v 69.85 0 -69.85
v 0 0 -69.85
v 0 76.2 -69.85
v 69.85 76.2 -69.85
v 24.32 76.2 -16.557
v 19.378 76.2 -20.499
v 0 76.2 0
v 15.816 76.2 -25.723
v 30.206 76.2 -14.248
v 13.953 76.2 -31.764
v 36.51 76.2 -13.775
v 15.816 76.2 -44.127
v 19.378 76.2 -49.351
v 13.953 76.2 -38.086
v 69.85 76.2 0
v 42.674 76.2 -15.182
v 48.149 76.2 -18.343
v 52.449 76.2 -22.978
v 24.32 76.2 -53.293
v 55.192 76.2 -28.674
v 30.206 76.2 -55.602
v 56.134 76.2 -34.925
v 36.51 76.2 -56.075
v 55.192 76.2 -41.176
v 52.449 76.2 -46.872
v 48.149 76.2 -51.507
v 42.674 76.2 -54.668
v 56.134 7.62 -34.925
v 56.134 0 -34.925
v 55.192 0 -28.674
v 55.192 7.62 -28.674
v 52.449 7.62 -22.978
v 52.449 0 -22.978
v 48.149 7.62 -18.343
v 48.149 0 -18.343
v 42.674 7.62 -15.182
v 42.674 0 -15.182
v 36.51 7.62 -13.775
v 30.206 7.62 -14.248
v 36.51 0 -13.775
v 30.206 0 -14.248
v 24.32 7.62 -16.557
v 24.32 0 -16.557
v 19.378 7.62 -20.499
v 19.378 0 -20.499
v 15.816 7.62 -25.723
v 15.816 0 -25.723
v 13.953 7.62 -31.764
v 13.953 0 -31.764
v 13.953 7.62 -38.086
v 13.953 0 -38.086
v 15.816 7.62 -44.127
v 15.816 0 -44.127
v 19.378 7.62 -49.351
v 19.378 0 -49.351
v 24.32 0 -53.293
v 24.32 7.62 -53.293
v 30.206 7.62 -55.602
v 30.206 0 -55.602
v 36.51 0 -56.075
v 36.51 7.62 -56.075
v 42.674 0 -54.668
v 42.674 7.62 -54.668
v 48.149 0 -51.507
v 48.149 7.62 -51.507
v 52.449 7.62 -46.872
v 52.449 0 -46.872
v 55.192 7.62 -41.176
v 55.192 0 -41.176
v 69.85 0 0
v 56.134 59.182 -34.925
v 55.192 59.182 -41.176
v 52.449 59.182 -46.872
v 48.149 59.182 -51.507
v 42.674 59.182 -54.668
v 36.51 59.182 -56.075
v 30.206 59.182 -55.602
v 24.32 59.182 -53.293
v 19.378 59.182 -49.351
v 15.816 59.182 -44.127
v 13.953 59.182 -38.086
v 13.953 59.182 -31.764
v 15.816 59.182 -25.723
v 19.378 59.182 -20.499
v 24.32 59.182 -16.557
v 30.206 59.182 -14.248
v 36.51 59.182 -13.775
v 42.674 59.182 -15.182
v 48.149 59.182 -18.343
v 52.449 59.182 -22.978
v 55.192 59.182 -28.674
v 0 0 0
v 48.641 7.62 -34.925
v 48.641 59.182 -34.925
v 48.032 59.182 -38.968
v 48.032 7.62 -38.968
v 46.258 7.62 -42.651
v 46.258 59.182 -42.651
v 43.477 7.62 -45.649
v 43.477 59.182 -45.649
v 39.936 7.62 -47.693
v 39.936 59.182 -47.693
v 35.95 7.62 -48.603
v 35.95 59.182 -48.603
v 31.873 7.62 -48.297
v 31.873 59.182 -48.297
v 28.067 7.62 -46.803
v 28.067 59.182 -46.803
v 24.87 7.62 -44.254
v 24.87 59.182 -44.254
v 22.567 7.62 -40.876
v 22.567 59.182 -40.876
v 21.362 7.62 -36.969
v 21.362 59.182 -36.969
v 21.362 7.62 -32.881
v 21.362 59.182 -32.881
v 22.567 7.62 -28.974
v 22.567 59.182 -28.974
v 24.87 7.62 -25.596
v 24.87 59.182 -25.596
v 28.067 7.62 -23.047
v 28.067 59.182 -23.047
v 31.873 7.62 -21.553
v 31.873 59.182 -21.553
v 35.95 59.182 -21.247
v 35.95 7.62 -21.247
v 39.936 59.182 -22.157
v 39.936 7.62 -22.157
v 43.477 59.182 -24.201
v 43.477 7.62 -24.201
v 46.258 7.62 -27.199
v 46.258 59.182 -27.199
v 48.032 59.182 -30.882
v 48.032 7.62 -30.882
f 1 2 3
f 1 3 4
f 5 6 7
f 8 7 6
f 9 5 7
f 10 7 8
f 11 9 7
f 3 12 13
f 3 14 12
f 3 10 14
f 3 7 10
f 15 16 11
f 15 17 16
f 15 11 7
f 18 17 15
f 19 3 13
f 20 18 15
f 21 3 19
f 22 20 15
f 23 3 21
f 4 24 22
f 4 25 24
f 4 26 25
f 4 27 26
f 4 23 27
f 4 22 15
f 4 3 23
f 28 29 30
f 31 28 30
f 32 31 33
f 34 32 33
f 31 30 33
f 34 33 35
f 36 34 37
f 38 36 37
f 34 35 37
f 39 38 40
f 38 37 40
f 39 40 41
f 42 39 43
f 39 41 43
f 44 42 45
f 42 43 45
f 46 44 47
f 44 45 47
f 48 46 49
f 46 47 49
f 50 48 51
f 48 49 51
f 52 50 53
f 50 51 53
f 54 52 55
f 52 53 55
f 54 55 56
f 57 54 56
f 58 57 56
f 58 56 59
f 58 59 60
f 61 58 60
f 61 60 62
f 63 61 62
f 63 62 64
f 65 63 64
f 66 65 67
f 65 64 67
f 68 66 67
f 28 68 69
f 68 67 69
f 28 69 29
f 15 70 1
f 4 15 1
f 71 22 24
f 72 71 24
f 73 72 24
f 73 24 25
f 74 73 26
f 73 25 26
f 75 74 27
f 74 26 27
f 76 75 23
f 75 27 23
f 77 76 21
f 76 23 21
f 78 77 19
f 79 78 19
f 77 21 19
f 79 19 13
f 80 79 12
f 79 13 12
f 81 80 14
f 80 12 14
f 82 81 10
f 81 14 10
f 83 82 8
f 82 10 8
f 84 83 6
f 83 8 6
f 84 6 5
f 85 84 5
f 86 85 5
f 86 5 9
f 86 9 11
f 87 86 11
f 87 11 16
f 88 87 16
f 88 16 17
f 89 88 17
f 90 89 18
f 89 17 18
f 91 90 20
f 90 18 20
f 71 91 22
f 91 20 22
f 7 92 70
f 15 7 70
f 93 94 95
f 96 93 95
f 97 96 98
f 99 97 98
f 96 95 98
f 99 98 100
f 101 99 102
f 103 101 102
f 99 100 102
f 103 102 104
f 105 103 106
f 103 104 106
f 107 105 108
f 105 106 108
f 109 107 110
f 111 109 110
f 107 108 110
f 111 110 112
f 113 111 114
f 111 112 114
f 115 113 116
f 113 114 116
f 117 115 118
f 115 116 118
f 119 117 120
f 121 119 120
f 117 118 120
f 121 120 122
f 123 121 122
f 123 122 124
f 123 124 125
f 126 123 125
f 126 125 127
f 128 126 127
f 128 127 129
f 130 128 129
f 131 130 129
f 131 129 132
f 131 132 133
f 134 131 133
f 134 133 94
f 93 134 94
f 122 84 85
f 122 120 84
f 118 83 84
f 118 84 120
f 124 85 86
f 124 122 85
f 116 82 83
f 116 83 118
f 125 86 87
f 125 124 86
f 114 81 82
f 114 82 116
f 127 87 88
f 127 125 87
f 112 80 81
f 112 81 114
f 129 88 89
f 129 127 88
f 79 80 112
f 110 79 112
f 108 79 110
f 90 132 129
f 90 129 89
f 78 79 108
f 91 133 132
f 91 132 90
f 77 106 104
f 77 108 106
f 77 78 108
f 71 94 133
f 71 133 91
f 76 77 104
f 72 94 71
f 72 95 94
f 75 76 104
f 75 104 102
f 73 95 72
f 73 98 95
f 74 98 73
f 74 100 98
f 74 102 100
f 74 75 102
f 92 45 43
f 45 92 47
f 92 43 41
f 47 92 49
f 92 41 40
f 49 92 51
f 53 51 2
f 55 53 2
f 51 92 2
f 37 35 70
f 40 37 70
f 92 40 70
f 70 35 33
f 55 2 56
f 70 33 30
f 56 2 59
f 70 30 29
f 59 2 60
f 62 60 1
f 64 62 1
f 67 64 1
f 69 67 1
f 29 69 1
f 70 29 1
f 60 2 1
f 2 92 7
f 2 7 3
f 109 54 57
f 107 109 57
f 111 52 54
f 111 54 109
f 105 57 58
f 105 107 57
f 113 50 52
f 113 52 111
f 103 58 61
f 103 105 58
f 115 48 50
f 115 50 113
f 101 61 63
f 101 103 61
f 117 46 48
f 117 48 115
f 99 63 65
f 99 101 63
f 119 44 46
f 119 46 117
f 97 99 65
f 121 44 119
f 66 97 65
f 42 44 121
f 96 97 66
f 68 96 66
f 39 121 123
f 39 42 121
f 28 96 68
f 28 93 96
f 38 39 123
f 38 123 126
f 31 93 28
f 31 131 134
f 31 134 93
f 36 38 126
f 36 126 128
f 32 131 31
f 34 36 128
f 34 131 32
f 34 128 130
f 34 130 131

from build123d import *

# Parameters (mm, degrees)
SKETCH1_W           = 69.85
SKETCH1_H           = 69.85
BOSS_EXTRUDE1_DEPTH = 76.2
SKETCH2_R           = 13.716
CUT_EXTRUDE1_DEPTH  = 76.2
SKETCH4_R           = 21.209
CUT_EXTRUDE2_DEPTH  = 17.018
SKETCH5_R           = 21.209
CUT_EXTRUDE3_DEPTH  = 7.62


with BuildPart() as part:
    # Sketch1 → Boss-Extrude1 (new body)
    with BuildSketch(Plane(origin=(0, 0, 0), x_dir=(1, 0, 0), z_dir=(0, 1, 0))):
        with Locations((34.925, 34.925)):
            Rectangle(SKETCH1_W, SKETCH1_H)
    extrude(amount=BOSS_EXTRUDE1_DEPTH)

    # Sketch2 → Cut-Extrude1 (cut)
    with BuildSketch(Plane(origin=(0, 76.2, 0), x_dir=(1, 0, 0), z_dir=(0, 1, 0))):
        with Locations((34.925, 34.925)):
            Circle(SKETCH2_R)
    extrude(amount=-CUT_EXTRUDE1_DEPTH, mode=Mode.SUBTRACT)

    # Sketch4 → Cut-Extrude2 (cut)
    with BuildSketch(Plane(origin=(0, 76.2, 0), x_dir=(1, 0, 0), z_dir=(0, 1, 0))):
        with Locations((34.925, 34.925)):
            Circle(SKETCH4_R)
    extrude(amount=-CUT_EXTRUDE2_DEPTH, mode=Mode.SUBTRACT)

    # Sketch5 → Cut-Extrude3 (cut)
    with BuildSketch(Plane.XZ):
        with Locations((34.925, -34.925)):
            Circle(SKETCH5_R)
    extrude(amount=-CUT_EXTRUDE3_DEPTH, mode=Mode.SUBTRACT)


solid = part.part
